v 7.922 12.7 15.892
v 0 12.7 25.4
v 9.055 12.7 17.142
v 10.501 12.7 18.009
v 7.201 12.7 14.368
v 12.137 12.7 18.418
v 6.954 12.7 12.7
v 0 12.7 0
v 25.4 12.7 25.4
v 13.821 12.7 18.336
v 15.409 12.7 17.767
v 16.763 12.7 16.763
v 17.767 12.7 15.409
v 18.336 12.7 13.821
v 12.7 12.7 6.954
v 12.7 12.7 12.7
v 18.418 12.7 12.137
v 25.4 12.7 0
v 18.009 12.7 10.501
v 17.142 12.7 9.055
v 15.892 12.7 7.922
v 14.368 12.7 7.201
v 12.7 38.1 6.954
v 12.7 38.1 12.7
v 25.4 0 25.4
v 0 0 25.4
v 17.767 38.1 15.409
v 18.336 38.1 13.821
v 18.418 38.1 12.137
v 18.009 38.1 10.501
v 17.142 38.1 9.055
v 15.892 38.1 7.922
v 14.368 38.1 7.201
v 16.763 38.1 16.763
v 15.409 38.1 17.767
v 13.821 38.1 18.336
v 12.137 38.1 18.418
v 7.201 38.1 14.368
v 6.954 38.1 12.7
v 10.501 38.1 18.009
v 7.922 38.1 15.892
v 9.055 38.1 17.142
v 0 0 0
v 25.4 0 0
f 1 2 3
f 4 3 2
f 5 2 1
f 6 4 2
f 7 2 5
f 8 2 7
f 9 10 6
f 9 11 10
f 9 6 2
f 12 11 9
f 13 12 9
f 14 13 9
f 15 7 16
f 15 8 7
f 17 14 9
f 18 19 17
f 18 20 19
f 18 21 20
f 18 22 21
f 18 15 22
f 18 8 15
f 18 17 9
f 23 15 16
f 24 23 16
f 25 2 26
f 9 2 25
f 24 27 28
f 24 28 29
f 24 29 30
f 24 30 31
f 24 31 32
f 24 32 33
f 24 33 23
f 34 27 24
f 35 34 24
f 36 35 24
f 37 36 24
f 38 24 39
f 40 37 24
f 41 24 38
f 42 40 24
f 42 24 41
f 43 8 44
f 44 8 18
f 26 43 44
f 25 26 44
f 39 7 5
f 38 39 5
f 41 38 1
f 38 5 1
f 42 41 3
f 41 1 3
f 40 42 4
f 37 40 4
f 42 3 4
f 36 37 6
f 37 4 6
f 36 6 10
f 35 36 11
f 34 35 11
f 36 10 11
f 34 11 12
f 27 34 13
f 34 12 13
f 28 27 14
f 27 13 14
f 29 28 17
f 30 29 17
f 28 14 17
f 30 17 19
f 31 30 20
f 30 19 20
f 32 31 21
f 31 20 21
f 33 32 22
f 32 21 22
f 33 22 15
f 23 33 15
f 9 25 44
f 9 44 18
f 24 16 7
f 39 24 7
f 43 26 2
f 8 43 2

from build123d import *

# Parameters (mm, degrees)
F0_W     = 25.4
F0_H     = 12.7
F1_DEPTH = 25.4
F3_DEPTH = 25.4


with BuildPart() as f1:
    # F0 (on Top) → F1 (new body)
    with BuildSketch(Plane.XY):
        with Locations((12.7, 6.35)):
            Rectangle(F0_W, F0_H)
    extrude(amount=F1_DEPTH)

    # F2 (on face) → F3 (join)
    with BuildSketch(Plane(origin=(0, 12.7, 0), x_dir=(-1, 0, 0), z_dir=(0, 1, 0))):
        with BuildLine():
            Line((-12.7, 12.7), (-6.9540247637, 12.7))
            ThreePointArc((-6.9540247637, 12.7), (-16.7630180541, 16.7630180541), (-12.7, 6.9540247637))
            Line((-12.7, 6.9540247637), (-12.7, 12.7))
        make_face()
    extrude(amount=F3_DEPTH)


solid = f1.part
